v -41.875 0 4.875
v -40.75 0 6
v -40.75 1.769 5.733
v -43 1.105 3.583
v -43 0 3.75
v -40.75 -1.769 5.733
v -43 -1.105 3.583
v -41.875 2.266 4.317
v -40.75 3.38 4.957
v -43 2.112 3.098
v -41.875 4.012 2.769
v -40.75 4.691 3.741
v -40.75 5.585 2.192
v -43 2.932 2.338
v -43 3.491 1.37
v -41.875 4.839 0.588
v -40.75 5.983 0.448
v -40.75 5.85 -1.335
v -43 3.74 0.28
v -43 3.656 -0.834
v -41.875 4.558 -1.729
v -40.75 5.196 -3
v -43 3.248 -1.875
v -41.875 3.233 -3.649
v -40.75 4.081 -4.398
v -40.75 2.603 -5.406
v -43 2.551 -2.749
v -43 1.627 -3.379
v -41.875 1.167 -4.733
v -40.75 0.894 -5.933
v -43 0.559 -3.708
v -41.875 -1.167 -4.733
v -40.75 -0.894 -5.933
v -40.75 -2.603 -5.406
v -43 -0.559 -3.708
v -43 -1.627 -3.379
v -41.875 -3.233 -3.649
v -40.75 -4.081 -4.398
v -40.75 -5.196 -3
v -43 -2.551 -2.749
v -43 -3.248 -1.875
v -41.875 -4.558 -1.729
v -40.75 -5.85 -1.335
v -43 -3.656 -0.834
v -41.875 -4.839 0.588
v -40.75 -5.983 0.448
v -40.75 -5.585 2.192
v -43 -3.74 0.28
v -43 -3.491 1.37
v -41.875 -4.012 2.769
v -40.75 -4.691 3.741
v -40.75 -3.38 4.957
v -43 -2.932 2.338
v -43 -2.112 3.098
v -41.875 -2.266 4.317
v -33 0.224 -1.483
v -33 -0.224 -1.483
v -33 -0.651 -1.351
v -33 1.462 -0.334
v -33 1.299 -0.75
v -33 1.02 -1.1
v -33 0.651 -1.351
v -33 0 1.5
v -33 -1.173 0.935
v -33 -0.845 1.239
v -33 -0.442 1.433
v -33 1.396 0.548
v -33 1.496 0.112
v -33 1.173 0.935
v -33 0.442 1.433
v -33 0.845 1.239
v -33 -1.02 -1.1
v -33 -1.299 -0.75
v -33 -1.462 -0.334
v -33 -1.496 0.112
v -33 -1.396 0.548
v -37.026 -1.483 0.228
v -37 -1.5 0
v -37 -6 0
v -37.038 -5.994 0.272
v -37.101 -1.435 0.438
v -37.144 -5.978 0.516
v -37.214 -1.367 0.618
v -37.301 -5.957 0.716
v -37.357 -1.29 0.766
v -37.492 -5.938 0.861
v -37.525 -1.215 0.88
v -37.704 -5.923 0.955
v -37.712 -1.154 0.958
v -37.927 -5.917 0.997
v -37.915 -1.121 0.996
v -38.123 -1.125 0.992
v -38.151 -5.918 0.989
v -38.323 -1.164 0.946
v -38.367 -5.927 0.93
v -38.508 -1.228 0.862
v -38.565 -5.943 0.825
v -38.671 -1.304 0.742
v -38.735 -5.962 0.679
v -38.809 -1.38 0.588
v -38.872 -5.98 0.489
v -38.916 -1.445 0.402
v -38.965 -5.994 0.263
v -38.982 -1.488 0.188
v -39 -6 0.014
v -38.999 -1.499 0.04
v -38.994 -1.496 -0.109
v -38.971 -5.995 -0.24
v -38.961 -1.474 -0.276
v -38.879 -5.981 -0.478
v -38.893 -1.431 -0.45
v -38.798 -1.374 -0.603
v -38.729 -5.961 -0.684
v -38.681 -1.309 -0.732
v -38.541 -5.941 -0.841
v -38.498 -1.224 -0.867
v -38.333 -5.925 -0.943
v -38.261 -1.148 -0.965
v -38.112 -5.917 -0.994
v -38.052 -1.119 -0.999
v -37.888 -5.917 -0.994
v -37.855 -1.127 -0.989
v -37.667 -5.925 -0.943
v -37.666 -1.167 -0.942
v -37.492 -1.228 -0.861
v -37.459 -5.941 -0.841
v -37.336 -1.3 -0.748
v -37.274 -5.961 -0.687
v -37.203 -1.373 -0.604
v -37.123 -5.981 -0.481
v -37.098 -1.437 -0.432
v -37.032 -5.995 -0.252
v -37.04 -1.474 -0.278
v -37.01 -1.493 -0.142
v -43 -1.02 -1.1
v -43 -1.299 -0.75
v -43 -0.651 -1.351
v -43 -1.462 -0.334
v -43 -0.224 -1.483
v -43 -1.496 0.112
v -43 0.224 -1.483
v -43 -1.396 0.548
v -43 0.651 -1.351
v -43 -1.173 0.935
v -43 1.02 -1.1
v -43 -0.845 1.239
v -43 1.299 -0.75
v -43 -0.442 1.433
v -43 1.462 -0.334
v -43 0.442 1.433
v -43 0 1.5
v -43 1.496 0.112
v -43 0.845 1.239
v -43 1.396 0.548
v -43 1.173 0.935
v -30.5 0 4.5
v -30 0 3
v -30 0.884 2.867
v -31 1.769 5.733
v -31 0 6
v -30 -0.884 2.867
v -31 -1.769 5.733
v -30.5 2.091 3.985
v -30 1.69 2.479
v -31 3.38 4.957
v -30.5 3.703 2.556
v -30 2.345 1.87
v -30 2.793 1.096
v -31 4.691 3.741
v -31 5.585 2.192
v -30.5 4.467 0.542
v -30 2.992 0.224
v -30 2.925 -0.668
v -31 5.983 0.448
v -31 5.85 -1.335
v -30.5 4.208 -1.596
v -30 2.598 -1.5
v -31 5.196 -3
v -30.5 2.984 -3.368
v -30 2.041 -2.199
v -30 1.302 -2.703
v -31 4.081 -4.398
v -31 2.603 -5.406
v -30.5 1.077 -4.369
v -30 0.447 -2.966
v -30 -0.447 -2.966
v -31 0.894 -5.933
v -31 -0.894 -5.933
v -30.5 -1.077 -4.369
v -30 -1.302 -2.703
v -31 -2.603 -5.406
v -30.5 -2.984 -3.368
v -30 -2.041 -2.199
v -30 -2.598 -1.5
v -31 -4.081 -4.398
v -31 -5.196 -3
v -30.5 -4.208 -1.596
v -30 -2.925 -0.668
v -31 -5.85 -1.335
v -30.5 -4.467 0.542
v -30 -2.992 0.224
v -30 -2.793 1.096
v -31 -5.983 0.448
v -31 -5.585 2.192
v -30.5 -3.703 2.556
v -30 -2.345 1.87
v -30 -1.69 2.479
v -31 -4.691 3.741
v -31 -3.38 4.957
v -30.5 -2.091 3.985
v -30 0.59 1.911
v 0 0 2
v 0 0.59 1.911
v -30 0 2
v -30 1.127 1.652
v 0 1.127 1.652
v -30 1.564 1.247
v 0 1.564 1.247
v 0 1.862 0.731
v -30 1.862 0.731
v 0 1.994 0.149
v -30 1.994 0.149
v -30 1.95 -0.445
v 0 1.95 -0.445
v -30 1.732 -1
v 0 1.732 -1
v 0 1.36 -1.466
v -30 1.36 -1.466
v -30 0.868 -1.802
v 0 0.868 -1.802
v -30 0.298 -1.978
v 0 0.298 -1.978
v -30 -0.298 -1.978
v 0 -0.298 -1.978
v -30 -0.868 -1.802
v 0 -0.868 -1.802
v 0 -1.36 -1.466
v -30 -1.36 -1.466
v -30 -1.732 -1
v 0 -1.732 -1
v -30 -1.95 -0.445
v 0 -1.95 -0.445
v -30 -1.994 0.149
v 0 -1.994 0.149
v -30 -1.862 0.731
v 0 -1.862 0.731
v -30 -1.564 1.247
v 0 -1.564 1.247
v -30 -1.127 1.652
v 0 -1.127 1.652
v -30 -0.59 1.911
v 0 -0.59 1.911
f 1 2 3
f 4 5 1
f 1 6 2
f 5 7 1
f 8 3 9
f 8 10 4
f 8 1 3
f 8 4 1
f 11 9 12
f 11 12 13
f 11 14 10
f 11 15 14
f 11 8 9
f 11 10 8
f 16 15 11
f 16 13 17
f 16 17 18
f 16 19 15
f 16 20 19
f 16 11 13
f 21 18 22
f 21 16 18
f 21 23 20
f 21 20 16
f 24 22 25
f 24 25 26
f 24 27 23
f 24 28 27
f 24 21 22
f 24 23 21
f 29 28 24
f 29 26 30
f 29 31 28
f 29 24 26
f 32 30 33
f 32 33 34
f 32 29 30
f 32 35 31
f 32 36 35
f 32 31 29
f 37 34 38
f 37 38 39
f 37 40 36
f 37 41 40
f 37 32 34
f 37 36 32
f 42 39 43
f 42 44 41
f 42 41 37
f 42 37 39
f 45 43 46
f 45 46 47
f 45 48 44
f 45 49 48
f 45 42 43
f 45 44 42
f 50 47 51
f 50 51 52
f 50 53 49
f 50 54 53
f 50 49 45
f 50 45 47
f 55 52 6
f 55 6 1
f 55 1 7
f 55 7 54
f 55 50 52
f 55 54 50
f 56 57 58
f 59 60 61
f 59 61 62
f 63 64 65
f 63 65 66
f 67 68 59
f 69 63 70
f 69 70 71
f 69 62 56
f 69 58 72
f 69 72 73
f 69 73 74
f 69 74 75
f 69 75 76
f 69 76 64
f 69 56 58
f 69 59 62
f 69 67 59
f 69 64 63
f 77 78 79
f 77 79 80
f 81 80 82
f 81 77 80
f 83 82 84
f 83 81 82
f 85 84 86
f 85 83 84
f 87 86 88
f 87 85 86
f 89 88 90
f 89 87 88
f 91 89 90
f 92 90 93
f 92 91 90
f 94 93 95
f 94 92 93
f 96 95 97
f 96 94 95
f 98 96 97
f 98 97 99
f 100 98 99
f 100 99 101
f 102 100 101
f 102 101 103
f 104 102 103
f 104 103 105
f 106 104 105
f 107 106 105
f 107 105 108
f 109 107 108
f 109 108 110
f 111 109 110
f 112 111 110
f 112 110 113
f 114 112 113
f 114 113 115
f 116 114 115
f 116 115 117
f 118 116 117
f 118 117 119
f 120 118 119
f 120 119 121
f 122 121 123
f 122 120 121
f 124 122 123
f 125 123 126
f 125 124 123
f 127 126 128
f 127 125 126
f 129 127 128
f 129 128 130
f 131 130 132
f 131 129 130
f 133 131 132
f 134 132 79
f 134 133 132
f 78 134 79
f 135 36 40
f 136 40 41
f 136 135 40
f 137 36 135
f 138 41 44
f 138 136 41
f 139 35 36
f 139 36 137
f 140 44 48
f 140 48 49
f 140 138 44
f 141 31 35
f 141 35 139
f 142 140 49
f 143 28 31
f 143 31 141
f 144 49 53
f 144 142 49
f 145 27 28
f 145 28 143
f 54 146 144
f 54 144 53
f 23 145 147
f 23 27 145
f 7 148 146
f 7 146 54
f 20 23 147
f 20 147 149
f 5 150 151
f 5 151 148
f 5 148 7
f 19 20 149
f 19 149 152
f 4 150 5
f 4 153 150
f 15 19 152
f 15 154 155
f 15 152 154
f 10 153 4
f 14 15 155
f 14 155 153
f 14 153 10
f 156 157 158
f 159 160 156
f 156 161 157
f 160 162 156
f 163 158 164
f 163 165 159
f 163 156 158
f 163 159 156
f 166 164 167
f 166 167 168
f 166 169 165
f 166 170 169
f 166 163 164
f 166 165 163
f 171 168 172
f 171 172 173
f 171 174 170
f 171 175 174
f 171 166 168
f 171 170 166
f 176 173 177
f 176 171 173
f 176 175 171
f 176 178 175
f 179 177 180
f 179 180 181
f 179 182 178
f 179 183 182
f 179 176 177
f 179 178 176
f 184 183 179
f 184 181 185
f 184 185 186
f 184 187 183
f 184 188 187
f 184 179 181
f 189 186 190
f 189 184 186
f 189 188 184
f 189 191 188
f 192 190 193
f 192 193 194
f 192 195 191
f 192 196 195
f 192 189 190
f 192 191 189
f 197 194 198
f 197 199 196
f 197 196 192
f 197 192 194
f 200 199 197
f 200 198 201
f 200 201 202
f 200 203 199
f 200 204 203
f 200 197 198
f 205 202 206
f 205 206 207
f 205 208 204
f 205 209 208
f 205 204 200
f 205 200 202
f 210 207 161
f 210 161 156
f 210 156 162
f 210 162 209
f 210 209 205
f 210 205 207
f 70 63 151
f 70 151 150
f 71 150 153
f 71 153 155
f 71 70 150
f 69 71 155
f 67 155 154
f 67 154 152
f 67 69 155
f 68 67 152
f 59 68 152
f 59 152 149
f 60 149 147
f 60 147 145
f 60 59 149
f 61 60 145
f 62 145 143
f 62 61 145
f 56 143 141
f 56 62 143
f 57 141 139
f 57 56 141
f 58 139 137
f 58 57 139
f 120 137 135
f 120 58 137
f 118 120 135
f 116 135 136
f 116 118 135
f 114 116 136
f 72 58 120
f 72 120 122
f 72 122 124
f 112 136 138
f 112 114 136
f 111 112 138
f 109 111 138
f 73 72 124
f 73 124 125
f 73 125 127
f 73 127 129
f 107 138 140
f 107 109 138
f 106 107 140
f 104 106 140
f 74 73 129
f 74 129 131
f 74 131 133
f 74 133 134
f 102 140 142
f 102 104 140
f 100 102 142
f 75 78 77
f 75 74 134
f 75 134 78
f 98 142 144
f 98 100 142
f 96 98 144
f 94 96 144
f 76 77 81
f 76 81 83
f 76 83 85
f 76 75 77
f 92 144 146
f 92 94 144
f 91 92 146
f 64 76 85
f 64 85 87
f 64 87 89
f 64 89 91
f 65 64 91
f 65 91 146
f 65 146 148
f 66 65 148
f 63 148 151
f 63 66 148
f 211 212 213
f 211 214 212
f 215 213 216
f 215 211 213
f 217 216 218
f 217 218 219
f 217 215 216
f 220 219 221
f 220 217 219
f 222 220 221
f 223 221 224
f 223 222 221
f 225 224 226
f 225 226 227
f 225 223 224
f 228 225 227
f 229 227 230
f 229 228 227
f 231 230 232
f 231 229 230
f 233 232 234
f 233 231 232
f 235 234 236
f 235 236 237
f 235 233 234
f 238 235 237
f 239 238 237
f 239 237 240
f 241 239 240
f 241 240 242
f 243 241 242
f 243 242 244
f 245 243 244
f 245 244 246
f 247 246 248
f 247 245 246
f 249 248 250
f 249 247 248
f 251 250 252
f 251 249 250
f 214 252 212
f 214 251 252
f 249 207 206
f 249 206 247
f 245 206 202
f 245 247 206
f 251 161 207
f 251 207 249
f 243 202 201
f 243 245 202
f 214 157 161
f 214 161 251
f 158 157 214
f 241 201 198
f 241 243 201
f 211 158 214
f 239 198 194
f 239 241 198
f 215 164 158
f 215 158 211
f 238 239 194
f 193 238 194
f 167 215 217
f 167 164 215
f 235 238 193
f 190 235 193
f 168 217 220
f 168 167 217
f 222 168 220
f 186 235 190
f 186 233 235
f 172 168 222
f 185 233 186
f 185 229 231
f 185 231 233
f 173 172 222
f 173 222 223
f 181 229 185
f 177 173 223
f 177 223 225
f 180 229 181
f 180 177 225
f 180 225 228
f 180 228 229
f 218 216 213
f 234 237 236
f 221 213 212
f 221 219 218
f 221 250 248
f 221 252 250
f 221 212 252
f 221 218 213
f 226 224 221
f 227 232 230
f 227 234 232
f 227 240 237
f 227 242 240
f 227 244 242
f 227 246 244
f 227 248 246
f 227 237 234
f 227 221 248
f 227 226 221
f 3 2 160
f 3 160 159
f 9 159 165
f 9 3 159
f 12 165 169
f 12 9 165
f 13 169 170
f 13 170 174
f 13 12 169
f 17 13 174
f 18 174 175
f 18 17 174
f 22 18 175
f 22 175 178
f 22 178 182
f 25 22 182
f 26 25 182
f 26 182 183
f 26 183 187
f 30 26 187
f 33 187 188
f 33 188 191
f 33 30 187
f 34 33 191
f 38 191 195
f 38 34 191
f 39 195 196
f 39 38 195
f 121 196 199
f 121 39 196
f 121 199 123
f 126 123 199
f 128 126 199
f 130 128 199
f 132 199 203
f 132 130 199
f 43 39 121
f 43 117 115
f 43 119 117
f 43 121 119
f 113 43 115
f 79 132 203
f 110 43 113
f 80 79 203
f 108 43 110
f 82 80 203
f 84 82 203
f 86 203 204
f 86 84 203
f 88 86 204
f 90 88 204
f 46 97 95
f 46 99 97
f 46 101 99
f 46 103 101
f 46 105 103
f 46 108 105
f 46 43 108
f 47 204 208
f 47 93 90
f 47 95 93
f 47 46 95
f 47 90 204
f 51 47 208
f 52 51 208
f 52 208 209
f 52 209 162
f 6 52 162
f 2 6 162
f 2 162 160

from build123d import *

# Parameters (mm, degrees)
F2_R     = 1
F3_DEPTH = 10
F4_SIZE2 = 1
F4_SIZE  = 3


with BuildPart() as f1:
    # F0 (on Front) → F1 (revolve)
    with BuildSketch(Plane.XZ):
        Polygon((-33, 0), (0, 0), (0, 2), (-30, 2), (-30, 6), (-40.75, 6), (-43, 3.75), (-43, 1.5), (-33, 1.5), align=None)
    revolve(axis=Axis((-16.5, 0, 0), (-1, 0, 0)))

    # F2 (on Front) → F3 (cut)
    with BuildSketch(Plane.XZ):
        with Locations((-38, 0)):
            Circle(F2_R)
    extrude(amount=F3_DEPTH, mode=Mode.SUBTRACT)

    # F4
    f4_edges = [f1.edges().sort_by_distance(p)[0] for p in [
        (-30, 0, -6),
    ]]
    chamfer(f4_edges, length=F4_SIZE, length2=F4_SIZE2)


solid = f1.part
